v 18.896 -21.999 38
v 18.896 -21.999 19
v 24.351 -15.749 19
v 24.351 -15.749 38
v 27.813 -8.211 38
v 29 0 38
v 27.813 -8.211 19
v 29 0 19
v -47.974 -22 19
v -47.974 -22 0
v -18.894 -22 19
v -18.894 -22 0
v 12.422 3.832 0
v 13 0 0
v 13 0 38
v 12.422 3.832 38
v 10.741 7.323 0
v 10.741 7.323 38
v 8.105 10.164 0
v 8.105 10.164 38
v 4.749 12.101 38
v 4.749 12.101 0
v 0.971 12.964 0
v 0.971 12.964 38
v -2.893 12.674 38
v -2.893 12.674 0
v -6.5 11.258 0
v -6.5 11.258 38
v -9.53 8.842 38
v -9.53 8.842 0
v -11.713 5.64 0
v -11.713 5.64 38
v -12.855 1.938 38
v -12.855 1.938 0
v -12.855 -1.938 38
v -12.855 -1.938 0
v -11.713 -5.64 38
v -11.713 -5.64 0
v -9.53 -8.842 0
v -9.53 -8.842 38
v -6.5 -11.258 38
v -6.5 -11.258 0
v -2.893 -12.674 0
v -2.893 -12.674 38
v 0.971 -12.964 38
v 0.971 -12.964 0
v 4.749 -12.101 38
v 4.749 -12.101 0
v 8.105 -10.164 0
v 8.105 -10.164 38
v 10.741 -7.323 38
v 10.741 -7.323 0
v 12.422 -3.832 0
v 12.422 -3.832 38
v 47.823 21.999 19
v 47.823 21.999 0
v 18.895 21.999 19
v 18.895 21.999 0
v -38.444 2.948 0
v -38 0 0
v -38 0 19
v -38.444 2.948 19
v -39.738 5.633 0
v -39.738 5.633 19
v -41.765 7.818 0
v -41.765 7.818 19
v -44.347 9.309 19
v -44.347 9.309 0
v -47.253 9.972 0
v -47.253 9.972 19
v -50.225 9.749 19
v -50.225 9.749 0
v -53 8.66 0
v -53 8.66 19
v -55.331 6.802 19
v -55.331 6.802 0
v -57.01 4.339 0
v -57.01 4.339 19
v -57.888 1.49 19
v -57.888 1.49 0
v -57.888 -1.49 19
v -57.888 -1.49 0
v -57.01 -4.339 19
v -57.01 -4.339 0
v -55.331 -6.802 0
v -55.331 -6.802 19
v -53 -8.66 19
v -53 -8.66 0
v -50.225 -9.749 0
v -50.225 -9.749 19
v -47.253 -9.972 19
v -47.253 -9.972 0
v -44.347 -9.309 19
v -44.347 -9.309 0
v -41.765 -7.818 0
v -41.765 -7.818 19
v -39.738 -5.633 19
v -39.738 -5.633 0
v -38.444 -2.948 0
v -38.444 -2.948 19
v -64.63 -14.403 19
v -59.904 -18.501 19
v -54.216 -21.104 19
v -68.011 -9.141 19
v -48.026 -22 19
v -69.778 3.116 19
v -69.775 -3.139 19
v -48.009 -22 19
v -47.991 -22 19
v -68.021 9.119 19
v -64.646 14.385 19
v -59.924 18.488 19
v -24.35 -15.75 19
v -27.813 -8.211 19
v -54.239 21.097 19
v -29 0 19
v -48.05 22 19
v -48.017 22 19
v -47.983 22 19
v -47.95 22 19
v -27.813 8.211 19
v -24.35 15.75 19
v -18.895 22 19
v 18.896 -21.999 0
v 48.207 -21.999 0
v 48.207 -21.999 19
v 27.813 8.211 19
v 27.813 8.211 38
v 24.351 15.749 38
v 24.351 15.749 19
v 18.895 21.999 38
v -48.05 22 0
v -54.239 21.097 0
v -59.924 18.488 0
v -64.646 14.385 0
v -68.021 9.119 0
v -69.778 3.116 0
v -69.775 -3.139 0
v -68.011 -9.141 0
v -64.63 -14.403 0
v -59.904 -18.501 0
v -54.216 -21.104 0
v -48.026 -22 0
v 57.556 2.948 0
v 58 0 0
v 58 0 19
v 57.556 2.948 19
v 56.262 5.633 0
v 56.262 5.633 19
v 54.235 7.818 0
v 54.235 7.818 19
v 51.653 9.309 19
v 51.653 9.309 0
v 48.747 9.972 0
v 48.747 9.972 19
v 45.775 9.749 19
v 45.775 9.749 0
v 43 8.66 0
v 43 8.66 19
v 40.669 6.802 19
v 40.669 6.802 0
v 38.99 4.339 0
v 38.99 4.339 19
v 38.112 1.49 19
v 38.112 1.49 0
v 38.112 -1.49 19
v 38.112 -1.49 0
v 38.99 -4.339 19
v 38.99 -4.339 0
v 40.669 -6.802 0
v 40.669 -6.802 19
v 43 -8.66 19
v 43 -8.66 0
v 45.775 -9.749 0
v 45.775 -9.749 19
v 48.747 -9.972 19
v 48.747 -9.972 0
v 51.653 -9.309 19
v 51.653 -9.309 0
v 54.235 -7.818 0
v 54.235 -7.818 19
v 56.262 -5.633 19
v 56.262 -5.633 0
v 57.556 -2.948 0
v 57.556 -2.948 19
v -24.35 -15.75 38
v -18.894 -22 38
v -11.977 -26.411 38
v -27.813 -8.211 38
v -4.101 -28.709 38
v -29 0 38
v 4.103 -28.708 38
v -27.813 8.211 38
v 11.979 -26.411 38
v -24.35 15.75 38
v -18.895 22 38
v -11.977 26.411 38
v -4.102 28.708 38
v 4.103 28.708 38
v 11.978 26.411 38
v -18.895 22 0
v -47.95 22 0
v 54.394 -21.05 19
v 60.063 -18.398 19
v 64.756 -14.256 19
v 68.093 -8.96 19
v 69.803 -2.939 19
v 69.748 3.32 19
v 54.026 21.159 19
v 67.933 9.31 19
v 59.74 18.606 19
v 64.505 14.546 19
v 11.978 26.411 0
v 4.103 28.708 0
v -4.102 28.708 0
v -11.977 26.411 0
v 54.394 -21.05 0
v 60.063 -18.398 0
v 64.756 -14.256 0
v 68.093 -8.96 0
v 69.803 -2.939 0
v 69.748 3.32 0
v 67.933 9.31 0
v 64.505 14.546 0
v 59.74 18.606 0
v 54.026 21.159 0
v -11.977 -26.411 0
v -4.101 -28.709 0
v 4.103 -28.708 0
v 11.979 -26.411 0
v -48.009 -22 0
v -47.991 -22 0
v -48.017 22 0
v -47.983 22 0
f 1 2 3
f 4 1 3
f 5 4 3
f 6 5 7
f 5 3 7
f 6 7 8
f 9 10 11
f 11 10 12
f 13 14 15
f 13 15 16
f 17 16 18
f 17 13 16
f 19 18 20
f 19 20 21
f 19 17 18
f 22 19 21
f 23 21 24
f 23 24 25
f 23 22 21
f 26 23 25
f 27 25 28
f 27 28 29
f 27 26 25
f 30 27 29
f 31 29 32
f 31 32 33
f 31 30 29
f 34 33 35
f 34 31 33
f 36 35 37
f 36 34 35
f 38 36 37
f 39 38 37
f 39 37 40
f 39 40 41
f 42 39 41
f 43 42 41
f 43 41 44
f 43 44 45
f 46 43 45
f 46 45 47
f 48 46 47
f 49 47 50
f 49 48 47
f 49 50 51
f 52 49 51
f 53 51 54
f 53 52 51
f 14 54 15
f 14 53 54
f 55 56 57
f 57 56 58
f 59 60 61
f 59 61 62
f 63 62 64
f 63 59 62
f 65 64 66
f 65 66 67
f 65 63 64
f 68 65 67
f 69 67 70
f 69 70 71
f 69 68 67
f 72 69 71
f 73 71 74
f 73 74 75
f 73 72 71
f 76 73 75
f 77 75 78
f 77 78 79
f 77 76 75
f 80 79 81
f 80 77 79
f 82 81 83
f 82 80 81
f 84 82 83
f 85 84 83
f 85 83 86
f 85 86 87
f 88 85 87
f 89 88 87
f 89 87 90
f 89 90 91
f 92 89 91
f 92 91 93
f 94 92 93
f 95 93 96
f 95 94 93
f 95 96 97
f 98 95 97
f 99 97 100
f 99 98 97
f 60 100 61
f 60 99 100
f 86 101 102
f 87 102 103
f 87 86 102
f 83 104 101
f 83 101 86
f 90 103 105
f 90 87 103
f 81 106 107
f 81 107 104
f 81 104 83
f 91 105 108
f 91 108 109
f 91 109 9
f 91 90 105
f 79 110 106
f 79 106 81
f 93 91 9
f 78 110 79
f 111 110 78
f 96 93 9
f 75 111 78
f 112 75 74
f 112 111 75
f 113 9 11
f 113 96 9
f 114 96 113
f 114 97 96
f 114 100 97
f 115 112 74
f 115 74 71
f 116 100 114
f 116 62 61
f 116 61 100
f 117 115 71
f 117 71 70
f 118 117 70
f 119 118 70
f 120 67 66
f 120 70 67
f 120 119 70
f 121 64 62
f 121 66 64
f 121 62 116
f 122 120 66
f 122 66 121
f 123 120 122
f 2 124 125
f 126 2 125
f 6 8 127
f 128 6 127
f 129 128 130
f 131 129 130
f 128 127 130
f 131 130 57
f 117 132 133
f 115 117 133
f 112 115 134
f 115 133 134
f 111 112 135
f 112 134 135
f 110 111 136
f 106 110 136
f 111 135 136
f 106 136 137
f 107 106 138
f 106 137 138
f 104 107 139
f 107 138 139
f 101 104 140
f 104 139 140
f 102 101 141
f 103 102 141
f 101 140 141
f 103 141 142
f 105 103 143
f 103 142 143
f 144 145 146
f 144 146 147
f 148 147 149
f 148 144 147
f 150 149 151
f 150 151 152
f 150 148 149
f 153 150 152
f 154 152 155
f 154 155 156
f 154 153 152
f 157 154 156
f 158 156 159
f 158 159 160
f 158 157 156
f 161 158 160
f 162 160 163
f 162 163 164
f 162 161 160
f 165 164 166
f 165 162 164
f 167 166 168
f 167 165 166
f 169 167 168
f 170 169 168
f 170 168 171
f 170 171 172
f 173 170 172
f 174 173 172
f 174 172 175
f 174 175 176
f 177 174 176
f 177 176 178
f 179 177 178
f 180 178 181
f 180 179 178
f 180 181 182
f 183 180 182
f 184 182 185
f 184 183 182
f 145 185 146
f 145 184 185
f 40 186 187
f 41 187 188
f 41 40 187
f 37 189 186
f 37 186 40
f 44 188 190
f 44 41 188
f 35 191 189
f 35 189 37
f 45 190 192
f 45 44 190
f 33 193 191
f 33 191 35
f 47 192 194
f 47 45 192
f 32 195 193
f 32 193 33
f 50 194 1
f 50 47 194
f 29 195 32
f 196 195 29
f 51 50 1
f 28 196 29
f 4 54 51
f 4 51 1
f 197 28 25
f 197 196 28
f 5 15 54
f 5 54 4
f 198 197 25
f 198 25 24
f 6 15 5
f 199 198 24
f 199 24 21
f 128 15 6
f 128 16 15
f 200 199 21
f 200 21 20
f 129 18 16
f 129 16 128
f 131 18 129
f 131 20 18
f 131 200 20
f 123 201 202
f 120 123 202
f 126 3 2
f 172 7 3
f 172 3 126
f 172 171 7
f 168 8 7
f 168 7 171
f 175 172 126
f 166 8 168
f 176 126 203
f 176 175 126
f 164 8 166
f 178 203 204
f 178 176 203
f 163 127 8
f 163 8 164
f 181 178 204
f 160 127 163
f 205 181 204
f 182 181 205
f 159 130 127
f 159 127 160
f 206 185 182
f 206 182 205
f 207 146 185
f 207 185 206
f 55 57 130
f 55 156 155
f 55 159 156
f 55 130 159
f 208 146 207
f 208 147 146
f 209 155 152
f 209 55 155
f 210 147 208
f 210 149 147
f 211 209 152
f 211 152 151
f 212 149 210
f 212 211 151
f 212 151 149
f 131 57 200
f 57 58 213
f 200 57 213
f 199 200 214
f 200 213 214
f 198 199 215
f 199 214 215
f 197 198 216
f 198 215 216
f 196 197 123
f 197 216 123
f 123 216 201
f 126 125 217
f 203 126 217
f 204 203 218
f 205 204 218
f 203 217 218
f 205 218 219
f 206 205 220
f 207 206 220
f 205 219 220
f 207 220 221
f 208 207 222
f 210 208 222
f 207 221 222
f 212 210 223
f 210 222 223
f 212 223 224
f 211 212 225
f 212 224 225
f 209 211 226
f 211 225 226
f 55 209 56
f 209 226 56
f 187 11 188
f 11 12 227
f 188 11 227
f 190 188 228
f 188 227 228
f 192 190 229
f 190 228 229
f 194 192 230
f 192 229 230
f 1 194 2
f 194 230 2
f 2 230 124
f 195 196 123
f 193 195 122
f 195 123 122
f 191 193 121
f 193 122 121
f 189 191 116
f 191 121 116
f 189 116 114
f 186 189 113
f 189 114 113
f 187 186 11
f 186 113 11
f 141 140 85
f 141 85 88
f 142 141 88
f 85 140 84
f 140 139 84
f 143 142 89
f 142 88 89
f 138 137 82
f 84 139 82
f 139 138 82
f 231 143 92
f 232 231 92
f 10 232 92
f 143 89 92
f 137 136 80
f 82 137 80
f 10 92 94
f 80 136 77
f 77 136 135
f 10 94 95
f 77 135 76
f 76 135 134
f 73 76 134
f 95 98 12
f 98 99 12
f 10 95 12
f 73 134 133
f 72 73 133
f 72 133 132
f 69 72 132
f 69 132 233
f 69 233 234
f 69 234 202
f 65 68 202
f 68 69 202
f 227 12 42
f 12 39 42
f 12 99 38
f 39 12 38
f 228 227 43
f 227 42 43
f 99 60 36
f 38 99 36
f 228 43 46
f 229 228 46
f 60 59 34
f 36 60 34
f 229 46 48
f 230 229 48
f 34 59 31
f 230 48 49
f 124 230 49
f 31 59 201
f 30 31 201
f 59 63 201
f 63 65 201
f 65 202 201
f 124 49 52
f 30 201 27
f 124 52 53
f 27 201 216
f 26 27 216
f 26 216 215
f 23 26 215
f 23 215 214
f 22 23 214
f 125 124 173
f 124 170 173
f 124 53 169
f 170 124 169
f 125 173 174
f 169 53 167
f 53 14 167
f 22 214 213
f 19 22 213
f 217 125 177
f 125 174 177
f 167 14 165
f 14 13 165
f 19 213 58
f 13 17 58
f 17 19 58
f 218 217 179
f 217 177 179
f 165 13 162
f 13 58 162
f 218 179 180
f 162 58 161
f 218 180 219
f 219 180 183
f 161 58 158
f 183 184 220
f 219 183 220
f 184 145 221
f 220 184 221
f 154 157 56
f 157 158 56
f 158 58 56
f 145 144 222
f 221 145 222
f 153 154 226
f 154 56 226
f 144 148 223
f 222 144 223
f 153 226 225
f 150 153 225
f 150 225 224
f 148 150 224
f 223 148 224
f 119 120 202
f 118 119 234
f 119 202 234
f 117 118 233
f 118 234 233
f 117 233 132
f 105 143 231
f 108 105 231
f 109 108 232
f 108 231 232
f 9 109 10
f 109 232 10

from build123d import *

# Parameters (mm, degrees)
F0_R     = 13
F1_DEPTH = 38
F0_R_2   = 10
F2_DEPTH = 19


with BuildPart() as f1:
    # F0 (on Top) → F1 (new body)
    with BuildSketch(Plane.XY):
        with BuildLine():
            ThreePointArc((18.895579, -21.999025), (26.3531, -12.104301), (29, 0))
            ThreePointArc((29, 0), (26.353016, 12.104485), (18.895272, 21.999288))
            ThreePointArc((18.895272, 21.999288), (0.000503, 29), (-18.894509, 21.999944))
            ThreePointArc((-18.894509, 21.999944), (-29, -3.2e-05), (-18.894461, -21.999985))
            ThreePointArc((-18.894461, -21.999985), (0.000737, -29), (18.895579, -21.999025))
        make_face()
        Circle(F0_R, mode=Mode.SUBTRACT)
    extrude(amount=F1_DEPTH)

    # F0 (on Top) → F2 (join)
    with BuildSketch(Plane.XY):
        with BuildLine():
            ThreePointArc((18.895272, 21.999288), (26.353016, 12.104485), (29, 0))
            ThreePointArc((29, 0), (26.3531, -12.104301), (18.895579, -21.999025))
            Line((18.895579, -21.999025), (47.792855, -21.999025))
            Line((47.792855, -21.999025), (48.207145, -21.999025))
            ThreePointArc((48.207145, -21.999025), (69.999162, 0.192041), (47.823064, 21.999288))
            Line((47.823064, 21.999288), (18.895272, 21.999288))
        make_face()
        with Locations((48, 0)):
            Circle(F0_R_2, mode=Mode.SUBTRACT)
        with BuildLine():
            ThreePointArc((-18.894461, -21.999985), (-29, -3.2e-05), (-18.894509, 21.999944))
            Line((-18.894509, 21.999944), (-47.950196, 21.999944))
            ThreePointArc((-47.950196, 21.999944), (-48, 22), (-48.049804, 21.999944))
            ThreePointArc((-48.049804, 21.999944), (-69.999997, -0.012047), (-48.025711, -21.999985))
            ThreePointArc((-48.025711, -21.999985), (-48, -22), (-47.974289, -21.999985))
            Line((-47.974289, -21.999985), (-18.894461, -21.999985))
        make_face()
        with Locations((-48, 0)):
            Circle(F0_R_2, mode=Mode.SUBTRACT)
    extrude(amount=F2_DEPTH)


solid = f1.part
